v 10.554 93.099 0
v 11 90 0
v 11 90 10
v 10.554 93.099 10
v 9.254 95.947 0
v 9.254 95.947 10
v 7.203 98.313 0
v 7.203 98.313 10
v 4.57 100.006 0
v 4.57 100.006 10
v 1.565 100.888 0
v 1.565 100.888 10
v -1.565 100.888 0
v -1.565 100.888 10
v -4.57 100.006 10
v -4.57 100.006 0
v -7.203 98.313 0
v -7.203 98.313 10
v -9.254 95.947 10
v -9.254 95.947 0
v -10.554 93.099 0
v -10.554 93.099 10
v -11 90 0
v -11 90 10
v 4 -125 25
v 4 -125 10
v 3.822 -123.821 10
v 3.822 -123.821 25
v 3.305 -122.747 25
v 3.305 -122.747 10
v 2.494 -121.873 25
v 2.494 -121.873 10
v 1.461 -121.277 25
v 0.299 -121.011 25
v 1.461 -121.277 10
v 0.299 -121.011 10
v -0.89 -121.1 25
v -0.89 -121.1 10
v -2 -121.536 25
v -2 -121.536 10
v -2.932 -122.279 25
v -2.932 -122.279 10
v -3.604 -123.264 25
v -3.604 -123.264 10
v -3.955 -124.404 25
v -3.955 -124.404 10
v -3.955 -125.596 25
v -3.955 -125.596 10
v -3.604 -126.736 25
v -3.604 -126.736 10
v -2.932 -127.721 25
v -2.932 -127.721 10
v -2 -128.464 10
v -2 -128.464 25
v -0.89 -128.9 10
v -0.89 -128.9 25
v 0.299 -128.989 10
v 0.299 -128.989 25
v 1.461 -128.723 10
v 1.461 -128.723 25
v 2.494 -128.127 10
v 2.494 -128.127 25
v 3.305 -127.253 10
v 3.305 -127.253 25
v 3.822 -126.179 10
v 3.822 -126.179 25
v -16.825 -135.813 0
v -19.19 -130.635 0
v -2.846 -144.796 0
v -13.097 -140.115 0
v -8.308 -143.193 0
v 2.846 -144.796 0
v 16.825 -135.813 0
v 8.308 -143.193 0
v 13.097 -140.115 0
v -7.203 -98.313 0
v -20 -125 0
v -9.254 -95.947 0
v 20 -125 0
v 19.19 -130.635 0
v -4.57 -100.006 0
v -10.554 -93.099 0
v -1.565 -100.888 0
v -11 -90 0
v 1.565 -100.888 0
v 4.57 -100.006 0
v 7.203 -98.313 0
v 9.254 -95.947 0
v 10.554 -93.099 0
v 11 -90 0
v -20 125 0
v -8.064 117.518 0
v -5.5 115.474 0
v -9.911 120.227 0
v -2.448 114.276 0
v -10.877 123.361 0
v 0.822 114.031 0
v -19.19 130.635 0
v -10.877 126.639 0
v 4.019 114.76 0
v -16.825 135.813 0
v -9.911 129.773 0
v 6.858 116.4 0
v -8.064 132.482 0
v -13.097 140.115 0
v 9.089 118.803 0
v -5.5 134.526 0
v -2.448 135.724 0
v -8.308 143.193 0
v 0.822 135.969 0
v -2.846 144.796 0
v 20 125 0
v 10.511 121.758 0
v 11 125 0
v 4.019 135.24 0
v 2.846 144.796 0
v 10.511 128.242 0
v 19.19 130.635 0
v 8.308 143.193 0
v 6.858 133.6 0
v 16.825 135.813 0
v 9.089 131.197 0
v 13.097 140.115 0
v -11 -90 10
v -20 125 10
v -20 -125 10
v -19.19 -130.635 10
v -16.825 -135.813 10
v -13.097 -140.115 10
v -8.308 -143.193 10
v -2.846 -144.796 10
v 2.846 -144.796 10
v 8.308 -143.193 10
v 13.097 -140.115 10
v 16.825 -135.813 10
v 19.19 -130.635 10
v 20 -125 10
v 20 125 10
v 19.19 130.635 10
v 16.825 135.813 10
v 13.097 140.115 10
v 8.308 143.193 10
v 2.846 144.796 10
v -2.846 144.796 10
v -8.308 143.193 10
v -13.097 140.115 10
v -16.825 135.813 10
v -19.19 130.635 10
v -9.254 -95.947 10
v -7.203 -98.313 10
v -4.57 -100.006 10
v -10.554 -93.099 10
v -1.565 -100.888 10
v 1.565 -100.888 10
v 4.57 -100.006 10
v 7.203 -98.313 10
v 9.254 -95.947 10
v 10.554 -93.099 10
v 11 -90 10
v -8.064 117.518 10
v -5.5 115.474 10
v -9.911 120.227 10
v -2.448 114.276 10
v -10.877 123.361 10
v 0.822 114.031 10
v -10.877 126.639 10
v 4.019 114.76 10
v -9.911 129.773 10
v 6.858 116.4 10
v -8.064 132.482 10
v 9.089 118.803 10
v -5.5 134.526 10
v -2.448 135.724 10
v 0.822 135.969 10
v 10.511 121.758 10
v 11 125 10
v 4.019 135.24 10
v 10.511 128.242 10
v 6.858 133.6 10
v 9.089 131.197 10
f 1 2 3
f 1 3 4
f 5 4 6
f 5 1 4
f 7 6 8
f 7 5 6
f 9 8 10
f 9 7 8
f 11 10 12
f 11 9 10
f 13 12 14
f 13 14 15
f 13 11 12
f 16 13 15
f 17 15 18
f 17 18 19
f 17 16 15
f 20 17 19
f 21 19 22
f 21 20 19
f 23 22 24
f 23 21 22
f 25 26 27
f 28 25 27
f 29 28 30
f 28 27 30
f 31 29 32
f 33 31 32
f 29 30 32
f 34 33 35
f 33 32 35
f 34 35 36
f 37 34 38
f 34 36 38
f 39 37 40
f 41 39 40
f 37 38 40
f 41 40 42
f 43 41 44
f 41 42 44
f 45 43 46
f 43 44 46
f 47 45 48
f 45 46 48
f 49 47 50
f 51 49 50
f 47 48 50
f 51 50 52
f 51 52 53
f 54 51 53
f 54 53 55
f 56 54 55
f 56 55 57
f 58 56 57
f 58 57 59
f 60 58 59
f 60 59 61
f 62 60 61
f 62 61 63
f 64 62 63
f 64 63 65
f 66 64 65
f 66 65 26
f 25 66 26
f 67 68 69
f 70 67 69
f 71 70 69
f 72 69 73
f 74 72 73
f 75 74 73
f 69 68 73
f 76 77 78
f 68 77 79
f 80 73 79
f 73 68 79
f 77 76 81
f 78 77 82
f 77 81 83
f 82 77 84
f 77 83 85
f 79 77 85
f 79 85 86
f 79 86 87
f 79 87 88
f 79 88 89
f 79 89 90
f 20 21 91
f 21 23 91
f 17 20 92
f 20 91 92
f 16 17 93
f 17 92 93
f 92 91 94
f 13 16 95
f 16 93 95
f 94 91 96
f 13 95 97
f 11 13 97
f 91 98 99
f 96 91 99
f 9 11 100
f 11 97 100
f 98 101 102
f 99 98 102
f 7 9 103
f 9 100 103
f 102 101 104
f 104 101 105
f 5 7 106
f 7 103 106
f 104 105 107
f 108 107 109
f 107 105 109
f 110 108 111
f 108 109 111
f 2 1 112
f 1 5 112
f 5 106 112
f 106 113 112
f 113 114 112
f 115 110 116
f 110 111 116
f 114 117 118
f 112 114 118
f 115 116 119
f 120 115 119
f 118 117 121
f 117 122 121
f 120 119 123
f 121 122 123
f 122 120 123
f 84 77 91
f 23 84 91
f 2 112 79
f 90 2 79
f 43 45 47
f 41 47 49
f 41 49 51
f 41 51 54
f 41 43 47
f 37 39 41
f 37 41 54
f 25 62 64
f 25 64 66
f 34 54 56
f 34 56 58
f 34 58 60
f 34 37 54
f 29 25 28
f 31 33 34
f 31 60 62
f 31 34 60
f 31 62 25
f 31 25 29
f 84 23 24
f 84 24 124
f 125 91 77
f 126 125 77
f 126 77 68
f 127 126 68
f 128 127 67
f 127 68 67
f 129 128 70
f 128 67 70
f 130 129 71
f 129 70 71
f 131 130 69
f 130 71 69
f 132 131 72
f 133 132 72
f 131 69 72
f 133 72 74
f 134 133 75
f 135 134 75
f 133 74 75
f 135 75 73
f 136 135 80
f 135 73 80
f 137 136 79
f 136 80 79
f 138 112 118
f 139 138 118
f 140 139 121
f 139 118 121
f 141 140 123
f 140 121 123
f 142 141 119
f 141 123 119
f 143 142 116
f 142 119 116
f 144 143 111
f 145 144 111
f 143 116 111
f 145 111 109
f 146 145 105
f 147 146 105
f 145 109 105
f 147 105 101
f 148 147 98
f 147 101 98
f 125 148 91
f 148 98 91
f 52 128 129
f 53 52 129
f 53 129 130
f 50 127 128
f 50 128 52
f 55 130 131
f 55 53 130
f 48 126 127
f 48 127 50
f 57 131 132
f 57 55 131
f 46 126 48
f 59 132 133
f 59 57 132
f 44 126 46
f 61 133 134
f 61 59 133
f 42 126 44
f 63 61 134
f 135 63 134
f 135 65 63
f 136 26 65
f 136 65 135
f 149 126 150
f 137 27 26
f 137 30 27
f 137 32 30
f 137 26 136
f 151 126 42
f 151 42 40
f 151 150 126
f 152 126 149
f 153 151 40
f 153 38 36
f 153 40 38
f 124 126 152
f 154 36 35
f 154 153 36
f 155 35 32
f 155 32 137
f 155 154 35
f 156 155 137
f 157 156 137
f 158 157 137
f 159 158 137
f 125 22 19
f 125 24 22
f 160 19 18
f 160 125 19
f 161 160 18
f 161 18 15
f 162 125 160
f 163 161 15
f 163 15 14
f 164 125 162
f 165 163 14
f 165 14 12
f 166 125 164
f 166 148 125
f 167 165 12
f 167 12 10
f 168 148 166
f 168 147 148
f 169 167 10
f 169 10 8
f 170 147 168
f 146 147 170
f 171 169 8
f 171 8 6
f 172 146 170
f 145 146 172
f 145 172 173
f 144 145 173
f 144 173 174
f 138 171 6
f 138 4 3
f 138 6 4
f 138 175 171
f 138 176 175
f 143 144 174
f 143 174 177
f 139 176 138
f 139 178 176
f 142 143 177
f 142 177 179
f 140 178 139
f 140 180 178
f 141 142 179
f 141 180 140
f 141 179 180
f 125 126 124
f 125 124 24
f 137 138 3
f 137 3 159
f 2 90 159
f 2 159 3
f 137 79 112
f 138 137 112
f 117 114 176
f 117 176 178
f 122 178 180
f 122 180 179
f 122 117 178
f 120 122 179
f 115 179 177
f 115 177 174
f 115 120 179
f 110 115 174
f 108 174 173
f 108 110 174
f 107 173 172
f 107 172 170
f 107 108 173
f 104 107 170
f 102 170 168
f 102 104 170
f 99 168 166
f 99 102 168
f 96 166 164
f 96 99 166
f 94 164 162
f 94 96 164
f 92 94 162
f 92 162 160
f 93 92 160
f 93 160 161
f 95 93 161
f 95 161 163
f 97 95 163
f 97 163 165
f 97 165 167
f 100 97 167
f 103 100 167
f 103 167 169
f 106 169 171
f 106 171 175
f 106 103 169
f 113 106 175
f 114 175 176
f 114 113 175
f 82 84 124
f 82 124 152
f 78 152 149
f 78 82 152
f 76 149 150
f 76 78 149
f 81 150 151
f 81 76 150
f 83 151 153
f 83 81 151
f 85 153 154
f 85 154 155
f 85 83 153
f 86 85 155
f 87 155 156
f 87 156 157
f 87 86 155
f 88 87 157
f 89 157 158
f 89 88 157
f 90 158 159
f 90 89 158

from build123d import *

# Parameters (mm, degrees)
SKETCH5_R           = 4
SKETCH5_R_2         = 11
BOSS_EXTRUDE4_DEPTH = 10
SKETCH5_3_R         = 4
BOSS_EXTRUDE5_DEPTH = 25


with BuildPart() as part:
    # Sketch5 → Boss-Extrude4 (new body)
    with BuildSketch(Plane.XY):
        with BuildLine():
            ThreePointArc((20, 125), (0, 145), (-20, 125))
            Line((-20, 125), (-20, -125))
            ThreePointArc((-20, -125), (0, -145), (20, -125))
            Line((20, -125), (20, 125))
        make_face()
        with Locations((0, -125)):
            Circle(SKETCH5_R, mode=Mode.SUBTRACT)
        with BuildLine():
            Line((-11, -90), (-11, 90))
            ThreePointArc((-11, 90), (0, 101), (11, 90))
            Line((11, 90), (11, -90))
            ThreePointArc((11, -90), (0, -101), (-11, -90))
        make_face(mode=Mode.SUBTRACT)
        with Locations((0, 125)):
            Circle(SKETCH5_R_2, mode=Mode.SUBTRACT)
    extrude(amount=BOSS_EXTRUDE4_DEPTH)

    # Sketch5<3> → Boss-Extrude5 (add)
    with BuildSketch(Plane.XY):
        with Locations((0, -125)):
            Circle(SKETCH5_3_R)
    extrude(amount=BOSS_EXTRUDE5_DEPTH)


solid = part.part
